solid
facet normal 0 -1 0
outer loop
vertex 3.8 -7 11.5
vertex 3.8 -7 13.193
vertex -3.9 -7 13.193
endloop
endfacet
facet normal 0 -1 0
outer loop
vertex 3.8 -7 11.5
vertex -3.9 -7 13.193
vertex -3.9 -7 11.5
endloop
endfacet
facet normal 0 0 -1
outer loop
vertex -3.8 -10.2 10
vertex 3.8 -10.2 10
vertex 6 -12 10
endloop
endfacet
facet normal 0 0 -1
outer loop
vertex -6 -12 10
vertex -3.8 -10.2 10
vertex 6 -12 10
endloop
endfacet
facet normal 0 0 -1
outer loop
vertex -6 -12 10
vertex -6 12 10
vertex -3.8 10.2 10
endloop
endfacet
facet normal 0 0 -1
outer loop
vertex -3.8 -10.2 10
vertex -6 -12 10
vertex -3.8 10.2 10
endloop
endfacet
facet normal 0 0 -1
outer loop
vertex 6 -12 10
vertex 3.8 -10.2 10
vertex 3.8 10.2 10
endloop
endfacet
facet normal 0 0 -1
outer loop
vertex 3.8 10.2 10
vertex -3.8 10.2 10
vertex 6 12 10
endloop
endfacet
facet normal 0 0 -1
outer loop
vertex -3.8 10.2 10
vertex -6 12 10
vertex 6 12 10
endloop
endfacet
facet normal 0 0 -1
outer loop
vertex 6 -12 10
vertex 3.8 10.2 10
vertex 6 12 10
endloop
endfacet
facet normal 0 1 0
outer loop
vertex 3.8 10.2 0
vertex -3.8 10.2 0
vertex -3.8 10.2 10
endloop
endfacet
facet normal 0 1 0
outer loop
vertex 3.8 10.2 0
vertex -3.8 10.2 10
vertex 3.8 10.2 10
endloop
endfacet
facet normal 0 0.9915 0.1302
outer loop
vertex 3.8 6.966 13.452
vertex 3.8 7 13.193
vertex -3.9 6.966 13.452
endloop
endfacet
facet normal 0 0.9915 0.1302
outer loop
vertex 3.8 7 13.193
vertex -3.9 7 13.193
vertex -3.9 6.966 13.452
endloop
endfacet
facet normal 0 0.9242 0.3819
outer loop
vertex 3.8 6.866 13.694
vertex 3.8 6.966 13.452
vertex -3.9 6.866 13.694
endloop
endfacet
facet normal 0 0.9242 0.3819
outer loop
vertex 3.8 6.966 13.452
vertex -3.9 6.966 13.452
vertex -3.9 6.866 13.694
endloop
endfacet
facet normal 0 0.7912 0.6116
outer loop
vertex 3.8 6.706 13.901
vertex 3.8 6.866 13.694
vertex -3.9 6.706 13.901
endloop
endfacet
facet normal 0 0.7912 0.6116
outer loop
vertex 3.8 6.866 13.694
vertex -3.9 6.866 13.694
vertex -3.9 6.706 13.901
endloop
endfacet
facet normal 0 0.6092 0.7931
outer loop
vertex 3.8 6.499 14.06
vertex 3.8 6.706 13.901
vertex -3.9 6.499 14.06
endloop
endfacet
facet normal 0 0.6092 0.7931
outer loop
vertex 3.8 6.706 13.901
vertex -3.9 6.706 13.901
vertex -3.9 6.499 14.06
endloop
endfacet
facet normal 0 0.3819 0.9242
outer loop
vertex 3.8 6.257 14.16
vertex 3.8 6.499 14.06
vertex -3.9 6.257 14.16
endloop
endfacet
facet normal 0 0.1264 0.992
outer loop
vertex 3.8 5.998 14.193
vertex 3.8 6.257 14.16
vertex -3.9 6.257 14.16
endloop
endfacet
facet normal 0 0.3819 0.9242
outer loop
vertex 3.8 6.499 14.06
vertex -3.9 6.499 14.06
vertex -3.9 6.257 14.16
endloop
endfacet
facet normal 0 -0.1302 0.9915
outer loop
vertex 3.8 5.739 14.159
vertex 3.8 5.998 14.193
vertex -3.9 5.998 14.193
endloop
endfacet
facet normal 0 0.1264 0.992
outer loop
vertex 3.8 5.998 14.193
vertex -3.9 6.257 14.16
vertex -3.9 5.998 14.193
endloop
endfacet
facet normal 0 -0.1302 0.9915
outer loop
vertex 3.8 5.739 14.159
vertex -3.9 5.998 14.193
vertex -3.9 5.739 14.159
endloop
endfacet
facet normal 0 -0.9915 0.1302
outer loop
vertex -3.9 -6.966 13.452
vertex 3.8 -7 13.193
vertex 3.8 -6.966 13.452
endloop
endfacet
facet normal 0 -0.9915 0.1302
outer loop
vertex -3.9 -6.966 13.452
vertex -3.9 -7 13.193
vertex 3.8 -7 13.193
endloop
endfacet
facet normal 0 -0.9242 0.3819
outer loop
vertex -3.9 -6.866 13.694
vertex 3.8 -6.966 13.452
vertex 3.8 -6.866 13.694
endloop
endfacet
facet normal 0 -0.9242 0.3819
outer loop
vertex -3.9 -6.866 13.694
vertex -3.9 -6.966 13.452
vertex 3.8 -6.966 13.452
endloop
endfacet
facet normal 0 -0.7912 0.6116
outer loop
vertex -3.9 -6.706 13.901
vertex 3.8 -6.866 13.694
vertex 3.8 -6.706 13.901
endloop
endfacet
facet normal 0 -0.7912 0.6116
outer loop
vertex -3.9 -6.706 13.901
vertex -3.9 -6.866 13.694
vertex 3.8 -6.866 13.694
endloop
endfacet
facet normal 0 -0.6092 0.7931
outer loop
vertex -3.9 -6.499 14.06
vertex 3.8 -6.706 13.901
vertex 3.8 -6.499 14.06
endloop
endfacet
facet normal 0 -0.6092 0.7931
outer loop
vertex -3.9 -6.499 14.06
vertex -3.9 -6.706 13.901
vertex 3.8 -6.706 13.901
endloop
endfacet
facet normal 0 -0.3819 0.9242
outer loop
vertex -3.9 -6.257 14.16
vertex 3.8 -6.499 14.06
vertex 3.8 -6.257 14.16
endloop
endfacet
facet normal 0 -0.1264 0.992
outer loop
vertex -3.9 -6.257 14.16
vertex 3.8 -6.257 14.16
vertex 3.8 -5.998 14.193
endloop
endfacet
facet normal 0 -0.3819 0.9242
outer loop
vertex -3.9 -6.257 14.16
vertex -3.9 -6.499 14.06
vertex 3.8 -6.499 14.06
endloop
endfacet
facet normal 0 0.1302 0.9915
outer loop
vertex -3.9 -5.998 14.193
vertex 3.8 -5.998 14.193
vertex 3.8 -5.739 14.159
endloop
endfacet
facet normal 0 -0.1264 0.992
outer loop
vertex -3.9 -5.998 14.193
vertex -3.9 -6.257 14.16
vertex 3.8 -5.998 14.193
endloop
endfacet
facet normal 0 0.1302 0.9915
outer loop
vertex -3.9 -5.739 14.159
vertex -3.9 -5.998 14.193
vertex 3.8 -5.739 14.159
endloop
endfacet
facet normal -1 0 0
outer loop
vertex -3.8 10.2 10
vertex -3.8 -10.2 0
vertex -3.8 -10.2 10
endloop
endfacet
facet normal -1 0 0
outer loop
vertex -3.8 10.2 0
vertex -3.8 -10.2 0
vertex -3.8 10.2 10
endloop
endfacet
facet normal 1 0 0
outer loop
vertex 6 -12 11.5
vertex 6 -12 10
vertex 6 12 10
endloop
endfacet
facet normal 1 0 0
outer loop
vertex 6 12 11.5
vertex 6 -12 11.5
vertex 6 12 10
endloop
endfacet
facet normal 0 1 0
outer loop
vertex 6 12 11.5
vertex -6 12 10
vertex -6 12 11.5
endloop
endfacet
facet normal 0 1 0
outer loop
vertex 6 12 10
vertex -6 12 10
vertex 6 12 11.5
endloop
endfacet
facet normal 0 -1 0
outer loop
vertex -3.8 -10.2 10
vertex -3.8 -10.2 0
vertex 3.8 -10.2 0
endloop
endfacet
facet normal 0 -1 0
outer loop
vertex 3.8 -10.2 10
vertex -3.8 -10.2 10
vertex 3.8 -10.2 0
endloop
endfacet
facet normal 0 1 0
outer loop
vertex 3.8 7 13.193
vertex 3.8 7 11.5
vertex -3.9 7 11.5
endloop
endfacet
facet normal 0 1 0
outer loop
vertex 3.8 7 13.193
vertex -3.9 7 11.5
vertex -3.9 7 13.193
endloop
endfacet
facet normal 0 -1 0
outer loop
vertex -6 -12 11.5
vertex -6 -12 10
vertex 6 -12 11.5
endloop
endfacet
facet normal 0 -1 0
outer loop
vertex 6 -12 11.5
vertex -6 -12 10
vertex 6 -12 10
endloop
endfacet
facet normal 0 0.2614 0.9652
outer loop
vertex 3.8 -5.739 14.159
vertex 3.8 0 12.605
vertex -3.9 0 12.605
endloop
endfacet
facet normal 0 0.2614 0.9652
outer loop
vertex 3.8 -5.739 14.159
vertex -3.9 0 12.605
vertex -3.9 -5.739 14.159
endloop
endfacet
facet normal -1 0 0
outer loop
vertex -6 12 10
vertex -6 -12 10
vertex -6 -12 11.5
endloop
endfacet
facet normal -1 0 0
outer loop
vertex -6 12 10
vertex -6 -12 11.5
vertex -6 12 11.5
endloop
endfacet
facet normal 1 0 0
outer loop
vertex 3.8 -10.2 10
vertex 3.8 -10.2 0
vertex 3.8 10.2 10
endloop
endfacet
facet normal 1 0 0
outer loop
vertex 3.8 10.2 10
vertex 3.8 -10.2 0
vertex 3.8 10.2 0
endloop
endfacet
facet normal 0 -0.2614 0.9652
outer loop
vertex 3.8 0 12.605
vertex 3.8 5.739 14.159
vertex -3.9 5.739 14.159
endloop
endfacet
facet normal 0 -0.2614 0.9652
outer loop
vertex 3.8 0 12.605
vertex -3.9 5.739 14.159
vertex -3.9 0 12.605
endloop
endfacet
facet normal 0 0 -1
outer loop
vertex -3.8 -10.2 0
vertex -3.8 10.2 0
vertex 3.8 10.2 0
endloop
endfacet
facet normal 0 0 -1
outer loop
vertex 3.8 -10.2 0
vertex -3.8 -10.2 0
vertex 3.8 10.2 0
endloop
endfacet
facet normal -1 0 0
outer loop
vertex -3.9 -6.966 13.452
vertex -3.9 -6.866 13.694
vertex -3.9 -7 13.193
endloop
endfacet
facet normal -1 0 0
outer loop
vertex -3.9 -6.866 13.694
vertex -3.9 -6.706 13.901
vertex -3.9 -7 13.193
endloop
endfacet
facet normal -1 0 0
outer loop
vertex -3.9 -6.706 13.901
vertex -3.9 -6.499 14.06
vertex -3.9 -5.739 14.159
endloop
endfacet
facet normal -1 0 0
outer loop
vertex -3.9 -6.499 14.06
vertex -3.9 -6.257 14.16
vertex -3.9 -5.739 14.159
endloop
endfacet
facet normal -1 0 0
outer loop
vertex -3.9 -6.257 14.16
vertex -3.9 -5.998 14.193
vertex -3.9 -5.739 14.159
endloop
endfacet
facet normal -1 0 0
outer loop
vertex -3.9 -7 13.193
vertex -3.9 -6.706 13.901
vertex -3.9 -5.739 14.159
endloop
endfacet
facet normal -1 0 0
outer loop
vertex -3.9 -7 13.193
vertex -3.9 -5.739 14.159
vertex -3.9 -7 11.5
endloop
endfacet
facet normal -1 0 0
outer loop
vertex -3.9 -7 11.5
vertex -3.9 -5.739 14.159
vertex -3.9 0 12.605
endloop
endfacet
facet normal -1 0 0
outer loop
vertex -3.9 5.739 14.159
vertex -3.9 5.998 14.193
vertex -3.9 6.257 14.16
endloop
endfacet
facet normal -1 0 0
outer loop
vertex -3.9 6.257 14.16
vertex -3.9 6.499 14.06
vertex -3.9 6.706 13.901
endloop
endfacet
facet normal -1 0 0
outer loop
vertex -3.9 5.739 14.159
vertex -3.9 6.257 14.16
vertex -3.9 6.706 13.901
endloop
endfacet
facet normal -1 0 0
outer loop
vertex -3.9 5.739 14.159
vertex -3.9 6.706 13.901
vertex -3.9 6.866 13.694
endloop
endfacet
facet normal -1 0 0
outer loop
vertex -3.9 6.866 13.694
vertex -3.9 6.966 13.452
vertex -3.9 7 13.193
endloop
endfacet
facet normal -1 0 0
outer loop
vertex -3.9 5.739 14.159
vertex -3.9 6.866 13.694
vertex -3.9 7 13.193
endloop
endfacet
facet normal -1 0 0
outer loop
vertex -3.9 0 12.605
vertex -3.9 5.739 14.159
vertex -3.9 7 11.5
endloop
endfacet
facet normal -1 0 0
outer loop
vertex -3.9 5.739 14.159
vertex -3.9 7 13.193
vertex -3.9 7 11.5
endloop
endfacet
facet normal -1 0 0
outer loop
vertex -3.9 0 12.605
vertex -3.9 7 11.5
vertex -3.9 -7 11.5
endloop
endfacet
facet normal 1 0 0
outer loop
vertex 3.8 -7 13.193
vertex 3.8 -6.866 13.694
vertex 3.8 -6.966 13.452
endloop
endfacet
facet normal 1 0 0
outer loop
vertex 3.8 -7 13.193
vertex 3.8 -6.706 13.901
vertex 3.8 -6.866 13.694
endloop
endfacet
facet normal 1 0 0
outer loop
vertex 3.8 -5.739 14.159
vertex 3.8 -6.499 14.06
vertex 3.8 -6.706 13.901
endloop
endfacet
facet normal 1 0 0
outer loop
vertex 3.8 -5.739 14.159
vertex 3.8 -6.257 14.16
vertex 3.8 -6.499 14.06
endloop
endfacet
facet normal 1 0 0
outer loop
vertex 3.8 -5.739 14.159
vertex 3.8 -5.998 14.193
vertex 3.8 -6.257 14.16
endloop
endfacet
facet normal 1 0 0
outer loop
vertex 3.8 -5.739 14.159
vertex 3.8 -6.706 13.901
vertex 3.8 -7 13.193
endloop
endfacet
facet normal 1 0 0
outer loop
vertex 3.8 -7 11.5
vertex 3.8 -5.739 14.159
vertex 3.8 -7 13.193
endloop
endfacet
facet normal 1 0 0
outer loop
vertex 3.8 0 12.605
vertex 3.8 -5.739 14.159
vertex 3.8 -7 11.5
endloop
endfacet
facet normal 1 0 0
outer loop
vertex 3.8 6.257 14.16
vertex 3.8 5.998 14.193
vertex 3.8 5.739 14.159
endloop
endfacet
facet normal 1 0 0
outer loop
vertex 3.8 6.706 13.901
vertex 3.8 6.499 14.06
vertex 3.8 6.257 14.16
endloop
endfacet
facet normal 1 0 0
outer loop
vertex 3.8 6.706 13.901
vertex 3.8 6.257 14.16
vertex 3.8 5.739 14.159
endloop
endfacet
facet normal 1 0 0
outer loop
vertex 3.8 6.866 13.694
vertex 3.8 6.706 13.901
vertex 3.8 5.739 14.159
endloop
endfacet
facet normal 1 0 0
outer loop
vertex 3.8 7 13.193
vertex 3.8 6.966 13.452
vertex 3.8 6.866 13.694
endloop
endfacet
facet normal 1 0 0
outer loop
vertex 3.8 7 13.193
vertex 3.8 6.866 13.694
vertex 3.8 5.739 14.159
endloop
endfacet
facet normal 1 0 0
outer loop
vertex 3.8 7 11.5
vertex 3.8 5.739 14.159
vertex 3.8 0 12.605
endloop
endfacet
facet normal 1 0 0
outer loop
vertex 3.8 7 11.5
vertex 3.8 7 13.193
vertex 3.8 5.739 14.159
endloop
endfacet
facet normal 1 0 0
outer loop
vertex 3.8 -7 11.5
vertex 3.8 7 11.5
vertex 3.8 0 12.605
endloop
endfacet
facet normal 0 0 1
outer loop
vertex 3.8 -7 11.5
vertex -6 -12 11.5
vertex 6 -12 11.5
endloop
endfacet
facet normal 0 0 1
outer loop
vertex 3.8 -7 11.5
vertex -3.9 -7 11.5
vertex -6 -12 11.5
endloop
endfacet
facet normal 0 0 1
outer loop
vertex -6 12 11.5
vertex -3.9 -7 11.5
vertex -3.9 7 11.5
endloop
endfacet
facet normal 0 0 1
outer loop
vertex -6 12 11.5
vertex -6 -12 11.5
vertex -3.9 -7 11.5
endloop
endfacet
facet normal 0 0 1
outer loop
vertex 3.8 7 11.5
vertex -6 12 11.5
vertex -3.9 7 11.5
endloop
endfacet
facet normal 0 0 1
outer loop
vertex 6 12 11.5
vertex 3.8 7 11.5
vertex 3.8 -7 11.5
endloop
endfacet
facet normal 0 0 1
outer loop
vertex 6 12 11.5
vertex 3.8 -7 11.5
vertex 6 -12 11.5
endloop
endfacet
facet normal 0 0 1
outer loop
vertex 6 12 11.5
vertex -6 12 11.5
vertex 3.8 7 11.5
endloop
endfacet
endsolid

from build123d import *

# Parameters (mm, degrees)
SKETCH1_W           = 7.6
SKETCH1_H           = 20.4
BOSS_EXTRUDE1_DEPTH = 10
SKETCH2_W           = 12
SKETCH2_H           = 24
BOSS_EXTRUDE2_DEPTH = 1.5
BOSS_EXTRUDE3_DEPTH = 7.7
FILLET1_R           = 1


with BuildPart() as part:
    # Sketch1 → Boss-Extrude1 (new body)
    with BuildSketch(Plane.XY):
        Rectangle(SKETCH1_W, SKETCH1_H)
    extrude(amount=BOSS_EXTRUDE1_DEPTH)

    # Sketch2 → Boss-Extrude2 (add)
    with BuildSketch(Plane.XY.offset(10)):
        Rectangle(SKETCH2_W, SKETCH2_H)
    extrude(amount=BOSS_EXTRUDE2_DEPTH)

    # Sketch3 → Boss-Extrude3 (add)
    with BuildSketch(Plane(origin=(3.8, 0, 0), x_dir=(0, 0, -1), z_dir=(1, 0, 0))):
        Polygon((-11.5, 7), (-14.5, 7), (-12.604811218, 0), (-14.5, -7), (-11.5, -7), align=None)
    extrude(amount=-BOSS_EXTRUDE3_DEPTH)

    # Fillet1
    fillet1_edges = [part.edges().sort_by_distance(p)[0] for p in [
        (-0.05, -7, 14.5),
        (-0.05, 7, 14.5),
    ]]
    fillet(fillet1_edges, radius=FILLET1_R)


solid = part.part
